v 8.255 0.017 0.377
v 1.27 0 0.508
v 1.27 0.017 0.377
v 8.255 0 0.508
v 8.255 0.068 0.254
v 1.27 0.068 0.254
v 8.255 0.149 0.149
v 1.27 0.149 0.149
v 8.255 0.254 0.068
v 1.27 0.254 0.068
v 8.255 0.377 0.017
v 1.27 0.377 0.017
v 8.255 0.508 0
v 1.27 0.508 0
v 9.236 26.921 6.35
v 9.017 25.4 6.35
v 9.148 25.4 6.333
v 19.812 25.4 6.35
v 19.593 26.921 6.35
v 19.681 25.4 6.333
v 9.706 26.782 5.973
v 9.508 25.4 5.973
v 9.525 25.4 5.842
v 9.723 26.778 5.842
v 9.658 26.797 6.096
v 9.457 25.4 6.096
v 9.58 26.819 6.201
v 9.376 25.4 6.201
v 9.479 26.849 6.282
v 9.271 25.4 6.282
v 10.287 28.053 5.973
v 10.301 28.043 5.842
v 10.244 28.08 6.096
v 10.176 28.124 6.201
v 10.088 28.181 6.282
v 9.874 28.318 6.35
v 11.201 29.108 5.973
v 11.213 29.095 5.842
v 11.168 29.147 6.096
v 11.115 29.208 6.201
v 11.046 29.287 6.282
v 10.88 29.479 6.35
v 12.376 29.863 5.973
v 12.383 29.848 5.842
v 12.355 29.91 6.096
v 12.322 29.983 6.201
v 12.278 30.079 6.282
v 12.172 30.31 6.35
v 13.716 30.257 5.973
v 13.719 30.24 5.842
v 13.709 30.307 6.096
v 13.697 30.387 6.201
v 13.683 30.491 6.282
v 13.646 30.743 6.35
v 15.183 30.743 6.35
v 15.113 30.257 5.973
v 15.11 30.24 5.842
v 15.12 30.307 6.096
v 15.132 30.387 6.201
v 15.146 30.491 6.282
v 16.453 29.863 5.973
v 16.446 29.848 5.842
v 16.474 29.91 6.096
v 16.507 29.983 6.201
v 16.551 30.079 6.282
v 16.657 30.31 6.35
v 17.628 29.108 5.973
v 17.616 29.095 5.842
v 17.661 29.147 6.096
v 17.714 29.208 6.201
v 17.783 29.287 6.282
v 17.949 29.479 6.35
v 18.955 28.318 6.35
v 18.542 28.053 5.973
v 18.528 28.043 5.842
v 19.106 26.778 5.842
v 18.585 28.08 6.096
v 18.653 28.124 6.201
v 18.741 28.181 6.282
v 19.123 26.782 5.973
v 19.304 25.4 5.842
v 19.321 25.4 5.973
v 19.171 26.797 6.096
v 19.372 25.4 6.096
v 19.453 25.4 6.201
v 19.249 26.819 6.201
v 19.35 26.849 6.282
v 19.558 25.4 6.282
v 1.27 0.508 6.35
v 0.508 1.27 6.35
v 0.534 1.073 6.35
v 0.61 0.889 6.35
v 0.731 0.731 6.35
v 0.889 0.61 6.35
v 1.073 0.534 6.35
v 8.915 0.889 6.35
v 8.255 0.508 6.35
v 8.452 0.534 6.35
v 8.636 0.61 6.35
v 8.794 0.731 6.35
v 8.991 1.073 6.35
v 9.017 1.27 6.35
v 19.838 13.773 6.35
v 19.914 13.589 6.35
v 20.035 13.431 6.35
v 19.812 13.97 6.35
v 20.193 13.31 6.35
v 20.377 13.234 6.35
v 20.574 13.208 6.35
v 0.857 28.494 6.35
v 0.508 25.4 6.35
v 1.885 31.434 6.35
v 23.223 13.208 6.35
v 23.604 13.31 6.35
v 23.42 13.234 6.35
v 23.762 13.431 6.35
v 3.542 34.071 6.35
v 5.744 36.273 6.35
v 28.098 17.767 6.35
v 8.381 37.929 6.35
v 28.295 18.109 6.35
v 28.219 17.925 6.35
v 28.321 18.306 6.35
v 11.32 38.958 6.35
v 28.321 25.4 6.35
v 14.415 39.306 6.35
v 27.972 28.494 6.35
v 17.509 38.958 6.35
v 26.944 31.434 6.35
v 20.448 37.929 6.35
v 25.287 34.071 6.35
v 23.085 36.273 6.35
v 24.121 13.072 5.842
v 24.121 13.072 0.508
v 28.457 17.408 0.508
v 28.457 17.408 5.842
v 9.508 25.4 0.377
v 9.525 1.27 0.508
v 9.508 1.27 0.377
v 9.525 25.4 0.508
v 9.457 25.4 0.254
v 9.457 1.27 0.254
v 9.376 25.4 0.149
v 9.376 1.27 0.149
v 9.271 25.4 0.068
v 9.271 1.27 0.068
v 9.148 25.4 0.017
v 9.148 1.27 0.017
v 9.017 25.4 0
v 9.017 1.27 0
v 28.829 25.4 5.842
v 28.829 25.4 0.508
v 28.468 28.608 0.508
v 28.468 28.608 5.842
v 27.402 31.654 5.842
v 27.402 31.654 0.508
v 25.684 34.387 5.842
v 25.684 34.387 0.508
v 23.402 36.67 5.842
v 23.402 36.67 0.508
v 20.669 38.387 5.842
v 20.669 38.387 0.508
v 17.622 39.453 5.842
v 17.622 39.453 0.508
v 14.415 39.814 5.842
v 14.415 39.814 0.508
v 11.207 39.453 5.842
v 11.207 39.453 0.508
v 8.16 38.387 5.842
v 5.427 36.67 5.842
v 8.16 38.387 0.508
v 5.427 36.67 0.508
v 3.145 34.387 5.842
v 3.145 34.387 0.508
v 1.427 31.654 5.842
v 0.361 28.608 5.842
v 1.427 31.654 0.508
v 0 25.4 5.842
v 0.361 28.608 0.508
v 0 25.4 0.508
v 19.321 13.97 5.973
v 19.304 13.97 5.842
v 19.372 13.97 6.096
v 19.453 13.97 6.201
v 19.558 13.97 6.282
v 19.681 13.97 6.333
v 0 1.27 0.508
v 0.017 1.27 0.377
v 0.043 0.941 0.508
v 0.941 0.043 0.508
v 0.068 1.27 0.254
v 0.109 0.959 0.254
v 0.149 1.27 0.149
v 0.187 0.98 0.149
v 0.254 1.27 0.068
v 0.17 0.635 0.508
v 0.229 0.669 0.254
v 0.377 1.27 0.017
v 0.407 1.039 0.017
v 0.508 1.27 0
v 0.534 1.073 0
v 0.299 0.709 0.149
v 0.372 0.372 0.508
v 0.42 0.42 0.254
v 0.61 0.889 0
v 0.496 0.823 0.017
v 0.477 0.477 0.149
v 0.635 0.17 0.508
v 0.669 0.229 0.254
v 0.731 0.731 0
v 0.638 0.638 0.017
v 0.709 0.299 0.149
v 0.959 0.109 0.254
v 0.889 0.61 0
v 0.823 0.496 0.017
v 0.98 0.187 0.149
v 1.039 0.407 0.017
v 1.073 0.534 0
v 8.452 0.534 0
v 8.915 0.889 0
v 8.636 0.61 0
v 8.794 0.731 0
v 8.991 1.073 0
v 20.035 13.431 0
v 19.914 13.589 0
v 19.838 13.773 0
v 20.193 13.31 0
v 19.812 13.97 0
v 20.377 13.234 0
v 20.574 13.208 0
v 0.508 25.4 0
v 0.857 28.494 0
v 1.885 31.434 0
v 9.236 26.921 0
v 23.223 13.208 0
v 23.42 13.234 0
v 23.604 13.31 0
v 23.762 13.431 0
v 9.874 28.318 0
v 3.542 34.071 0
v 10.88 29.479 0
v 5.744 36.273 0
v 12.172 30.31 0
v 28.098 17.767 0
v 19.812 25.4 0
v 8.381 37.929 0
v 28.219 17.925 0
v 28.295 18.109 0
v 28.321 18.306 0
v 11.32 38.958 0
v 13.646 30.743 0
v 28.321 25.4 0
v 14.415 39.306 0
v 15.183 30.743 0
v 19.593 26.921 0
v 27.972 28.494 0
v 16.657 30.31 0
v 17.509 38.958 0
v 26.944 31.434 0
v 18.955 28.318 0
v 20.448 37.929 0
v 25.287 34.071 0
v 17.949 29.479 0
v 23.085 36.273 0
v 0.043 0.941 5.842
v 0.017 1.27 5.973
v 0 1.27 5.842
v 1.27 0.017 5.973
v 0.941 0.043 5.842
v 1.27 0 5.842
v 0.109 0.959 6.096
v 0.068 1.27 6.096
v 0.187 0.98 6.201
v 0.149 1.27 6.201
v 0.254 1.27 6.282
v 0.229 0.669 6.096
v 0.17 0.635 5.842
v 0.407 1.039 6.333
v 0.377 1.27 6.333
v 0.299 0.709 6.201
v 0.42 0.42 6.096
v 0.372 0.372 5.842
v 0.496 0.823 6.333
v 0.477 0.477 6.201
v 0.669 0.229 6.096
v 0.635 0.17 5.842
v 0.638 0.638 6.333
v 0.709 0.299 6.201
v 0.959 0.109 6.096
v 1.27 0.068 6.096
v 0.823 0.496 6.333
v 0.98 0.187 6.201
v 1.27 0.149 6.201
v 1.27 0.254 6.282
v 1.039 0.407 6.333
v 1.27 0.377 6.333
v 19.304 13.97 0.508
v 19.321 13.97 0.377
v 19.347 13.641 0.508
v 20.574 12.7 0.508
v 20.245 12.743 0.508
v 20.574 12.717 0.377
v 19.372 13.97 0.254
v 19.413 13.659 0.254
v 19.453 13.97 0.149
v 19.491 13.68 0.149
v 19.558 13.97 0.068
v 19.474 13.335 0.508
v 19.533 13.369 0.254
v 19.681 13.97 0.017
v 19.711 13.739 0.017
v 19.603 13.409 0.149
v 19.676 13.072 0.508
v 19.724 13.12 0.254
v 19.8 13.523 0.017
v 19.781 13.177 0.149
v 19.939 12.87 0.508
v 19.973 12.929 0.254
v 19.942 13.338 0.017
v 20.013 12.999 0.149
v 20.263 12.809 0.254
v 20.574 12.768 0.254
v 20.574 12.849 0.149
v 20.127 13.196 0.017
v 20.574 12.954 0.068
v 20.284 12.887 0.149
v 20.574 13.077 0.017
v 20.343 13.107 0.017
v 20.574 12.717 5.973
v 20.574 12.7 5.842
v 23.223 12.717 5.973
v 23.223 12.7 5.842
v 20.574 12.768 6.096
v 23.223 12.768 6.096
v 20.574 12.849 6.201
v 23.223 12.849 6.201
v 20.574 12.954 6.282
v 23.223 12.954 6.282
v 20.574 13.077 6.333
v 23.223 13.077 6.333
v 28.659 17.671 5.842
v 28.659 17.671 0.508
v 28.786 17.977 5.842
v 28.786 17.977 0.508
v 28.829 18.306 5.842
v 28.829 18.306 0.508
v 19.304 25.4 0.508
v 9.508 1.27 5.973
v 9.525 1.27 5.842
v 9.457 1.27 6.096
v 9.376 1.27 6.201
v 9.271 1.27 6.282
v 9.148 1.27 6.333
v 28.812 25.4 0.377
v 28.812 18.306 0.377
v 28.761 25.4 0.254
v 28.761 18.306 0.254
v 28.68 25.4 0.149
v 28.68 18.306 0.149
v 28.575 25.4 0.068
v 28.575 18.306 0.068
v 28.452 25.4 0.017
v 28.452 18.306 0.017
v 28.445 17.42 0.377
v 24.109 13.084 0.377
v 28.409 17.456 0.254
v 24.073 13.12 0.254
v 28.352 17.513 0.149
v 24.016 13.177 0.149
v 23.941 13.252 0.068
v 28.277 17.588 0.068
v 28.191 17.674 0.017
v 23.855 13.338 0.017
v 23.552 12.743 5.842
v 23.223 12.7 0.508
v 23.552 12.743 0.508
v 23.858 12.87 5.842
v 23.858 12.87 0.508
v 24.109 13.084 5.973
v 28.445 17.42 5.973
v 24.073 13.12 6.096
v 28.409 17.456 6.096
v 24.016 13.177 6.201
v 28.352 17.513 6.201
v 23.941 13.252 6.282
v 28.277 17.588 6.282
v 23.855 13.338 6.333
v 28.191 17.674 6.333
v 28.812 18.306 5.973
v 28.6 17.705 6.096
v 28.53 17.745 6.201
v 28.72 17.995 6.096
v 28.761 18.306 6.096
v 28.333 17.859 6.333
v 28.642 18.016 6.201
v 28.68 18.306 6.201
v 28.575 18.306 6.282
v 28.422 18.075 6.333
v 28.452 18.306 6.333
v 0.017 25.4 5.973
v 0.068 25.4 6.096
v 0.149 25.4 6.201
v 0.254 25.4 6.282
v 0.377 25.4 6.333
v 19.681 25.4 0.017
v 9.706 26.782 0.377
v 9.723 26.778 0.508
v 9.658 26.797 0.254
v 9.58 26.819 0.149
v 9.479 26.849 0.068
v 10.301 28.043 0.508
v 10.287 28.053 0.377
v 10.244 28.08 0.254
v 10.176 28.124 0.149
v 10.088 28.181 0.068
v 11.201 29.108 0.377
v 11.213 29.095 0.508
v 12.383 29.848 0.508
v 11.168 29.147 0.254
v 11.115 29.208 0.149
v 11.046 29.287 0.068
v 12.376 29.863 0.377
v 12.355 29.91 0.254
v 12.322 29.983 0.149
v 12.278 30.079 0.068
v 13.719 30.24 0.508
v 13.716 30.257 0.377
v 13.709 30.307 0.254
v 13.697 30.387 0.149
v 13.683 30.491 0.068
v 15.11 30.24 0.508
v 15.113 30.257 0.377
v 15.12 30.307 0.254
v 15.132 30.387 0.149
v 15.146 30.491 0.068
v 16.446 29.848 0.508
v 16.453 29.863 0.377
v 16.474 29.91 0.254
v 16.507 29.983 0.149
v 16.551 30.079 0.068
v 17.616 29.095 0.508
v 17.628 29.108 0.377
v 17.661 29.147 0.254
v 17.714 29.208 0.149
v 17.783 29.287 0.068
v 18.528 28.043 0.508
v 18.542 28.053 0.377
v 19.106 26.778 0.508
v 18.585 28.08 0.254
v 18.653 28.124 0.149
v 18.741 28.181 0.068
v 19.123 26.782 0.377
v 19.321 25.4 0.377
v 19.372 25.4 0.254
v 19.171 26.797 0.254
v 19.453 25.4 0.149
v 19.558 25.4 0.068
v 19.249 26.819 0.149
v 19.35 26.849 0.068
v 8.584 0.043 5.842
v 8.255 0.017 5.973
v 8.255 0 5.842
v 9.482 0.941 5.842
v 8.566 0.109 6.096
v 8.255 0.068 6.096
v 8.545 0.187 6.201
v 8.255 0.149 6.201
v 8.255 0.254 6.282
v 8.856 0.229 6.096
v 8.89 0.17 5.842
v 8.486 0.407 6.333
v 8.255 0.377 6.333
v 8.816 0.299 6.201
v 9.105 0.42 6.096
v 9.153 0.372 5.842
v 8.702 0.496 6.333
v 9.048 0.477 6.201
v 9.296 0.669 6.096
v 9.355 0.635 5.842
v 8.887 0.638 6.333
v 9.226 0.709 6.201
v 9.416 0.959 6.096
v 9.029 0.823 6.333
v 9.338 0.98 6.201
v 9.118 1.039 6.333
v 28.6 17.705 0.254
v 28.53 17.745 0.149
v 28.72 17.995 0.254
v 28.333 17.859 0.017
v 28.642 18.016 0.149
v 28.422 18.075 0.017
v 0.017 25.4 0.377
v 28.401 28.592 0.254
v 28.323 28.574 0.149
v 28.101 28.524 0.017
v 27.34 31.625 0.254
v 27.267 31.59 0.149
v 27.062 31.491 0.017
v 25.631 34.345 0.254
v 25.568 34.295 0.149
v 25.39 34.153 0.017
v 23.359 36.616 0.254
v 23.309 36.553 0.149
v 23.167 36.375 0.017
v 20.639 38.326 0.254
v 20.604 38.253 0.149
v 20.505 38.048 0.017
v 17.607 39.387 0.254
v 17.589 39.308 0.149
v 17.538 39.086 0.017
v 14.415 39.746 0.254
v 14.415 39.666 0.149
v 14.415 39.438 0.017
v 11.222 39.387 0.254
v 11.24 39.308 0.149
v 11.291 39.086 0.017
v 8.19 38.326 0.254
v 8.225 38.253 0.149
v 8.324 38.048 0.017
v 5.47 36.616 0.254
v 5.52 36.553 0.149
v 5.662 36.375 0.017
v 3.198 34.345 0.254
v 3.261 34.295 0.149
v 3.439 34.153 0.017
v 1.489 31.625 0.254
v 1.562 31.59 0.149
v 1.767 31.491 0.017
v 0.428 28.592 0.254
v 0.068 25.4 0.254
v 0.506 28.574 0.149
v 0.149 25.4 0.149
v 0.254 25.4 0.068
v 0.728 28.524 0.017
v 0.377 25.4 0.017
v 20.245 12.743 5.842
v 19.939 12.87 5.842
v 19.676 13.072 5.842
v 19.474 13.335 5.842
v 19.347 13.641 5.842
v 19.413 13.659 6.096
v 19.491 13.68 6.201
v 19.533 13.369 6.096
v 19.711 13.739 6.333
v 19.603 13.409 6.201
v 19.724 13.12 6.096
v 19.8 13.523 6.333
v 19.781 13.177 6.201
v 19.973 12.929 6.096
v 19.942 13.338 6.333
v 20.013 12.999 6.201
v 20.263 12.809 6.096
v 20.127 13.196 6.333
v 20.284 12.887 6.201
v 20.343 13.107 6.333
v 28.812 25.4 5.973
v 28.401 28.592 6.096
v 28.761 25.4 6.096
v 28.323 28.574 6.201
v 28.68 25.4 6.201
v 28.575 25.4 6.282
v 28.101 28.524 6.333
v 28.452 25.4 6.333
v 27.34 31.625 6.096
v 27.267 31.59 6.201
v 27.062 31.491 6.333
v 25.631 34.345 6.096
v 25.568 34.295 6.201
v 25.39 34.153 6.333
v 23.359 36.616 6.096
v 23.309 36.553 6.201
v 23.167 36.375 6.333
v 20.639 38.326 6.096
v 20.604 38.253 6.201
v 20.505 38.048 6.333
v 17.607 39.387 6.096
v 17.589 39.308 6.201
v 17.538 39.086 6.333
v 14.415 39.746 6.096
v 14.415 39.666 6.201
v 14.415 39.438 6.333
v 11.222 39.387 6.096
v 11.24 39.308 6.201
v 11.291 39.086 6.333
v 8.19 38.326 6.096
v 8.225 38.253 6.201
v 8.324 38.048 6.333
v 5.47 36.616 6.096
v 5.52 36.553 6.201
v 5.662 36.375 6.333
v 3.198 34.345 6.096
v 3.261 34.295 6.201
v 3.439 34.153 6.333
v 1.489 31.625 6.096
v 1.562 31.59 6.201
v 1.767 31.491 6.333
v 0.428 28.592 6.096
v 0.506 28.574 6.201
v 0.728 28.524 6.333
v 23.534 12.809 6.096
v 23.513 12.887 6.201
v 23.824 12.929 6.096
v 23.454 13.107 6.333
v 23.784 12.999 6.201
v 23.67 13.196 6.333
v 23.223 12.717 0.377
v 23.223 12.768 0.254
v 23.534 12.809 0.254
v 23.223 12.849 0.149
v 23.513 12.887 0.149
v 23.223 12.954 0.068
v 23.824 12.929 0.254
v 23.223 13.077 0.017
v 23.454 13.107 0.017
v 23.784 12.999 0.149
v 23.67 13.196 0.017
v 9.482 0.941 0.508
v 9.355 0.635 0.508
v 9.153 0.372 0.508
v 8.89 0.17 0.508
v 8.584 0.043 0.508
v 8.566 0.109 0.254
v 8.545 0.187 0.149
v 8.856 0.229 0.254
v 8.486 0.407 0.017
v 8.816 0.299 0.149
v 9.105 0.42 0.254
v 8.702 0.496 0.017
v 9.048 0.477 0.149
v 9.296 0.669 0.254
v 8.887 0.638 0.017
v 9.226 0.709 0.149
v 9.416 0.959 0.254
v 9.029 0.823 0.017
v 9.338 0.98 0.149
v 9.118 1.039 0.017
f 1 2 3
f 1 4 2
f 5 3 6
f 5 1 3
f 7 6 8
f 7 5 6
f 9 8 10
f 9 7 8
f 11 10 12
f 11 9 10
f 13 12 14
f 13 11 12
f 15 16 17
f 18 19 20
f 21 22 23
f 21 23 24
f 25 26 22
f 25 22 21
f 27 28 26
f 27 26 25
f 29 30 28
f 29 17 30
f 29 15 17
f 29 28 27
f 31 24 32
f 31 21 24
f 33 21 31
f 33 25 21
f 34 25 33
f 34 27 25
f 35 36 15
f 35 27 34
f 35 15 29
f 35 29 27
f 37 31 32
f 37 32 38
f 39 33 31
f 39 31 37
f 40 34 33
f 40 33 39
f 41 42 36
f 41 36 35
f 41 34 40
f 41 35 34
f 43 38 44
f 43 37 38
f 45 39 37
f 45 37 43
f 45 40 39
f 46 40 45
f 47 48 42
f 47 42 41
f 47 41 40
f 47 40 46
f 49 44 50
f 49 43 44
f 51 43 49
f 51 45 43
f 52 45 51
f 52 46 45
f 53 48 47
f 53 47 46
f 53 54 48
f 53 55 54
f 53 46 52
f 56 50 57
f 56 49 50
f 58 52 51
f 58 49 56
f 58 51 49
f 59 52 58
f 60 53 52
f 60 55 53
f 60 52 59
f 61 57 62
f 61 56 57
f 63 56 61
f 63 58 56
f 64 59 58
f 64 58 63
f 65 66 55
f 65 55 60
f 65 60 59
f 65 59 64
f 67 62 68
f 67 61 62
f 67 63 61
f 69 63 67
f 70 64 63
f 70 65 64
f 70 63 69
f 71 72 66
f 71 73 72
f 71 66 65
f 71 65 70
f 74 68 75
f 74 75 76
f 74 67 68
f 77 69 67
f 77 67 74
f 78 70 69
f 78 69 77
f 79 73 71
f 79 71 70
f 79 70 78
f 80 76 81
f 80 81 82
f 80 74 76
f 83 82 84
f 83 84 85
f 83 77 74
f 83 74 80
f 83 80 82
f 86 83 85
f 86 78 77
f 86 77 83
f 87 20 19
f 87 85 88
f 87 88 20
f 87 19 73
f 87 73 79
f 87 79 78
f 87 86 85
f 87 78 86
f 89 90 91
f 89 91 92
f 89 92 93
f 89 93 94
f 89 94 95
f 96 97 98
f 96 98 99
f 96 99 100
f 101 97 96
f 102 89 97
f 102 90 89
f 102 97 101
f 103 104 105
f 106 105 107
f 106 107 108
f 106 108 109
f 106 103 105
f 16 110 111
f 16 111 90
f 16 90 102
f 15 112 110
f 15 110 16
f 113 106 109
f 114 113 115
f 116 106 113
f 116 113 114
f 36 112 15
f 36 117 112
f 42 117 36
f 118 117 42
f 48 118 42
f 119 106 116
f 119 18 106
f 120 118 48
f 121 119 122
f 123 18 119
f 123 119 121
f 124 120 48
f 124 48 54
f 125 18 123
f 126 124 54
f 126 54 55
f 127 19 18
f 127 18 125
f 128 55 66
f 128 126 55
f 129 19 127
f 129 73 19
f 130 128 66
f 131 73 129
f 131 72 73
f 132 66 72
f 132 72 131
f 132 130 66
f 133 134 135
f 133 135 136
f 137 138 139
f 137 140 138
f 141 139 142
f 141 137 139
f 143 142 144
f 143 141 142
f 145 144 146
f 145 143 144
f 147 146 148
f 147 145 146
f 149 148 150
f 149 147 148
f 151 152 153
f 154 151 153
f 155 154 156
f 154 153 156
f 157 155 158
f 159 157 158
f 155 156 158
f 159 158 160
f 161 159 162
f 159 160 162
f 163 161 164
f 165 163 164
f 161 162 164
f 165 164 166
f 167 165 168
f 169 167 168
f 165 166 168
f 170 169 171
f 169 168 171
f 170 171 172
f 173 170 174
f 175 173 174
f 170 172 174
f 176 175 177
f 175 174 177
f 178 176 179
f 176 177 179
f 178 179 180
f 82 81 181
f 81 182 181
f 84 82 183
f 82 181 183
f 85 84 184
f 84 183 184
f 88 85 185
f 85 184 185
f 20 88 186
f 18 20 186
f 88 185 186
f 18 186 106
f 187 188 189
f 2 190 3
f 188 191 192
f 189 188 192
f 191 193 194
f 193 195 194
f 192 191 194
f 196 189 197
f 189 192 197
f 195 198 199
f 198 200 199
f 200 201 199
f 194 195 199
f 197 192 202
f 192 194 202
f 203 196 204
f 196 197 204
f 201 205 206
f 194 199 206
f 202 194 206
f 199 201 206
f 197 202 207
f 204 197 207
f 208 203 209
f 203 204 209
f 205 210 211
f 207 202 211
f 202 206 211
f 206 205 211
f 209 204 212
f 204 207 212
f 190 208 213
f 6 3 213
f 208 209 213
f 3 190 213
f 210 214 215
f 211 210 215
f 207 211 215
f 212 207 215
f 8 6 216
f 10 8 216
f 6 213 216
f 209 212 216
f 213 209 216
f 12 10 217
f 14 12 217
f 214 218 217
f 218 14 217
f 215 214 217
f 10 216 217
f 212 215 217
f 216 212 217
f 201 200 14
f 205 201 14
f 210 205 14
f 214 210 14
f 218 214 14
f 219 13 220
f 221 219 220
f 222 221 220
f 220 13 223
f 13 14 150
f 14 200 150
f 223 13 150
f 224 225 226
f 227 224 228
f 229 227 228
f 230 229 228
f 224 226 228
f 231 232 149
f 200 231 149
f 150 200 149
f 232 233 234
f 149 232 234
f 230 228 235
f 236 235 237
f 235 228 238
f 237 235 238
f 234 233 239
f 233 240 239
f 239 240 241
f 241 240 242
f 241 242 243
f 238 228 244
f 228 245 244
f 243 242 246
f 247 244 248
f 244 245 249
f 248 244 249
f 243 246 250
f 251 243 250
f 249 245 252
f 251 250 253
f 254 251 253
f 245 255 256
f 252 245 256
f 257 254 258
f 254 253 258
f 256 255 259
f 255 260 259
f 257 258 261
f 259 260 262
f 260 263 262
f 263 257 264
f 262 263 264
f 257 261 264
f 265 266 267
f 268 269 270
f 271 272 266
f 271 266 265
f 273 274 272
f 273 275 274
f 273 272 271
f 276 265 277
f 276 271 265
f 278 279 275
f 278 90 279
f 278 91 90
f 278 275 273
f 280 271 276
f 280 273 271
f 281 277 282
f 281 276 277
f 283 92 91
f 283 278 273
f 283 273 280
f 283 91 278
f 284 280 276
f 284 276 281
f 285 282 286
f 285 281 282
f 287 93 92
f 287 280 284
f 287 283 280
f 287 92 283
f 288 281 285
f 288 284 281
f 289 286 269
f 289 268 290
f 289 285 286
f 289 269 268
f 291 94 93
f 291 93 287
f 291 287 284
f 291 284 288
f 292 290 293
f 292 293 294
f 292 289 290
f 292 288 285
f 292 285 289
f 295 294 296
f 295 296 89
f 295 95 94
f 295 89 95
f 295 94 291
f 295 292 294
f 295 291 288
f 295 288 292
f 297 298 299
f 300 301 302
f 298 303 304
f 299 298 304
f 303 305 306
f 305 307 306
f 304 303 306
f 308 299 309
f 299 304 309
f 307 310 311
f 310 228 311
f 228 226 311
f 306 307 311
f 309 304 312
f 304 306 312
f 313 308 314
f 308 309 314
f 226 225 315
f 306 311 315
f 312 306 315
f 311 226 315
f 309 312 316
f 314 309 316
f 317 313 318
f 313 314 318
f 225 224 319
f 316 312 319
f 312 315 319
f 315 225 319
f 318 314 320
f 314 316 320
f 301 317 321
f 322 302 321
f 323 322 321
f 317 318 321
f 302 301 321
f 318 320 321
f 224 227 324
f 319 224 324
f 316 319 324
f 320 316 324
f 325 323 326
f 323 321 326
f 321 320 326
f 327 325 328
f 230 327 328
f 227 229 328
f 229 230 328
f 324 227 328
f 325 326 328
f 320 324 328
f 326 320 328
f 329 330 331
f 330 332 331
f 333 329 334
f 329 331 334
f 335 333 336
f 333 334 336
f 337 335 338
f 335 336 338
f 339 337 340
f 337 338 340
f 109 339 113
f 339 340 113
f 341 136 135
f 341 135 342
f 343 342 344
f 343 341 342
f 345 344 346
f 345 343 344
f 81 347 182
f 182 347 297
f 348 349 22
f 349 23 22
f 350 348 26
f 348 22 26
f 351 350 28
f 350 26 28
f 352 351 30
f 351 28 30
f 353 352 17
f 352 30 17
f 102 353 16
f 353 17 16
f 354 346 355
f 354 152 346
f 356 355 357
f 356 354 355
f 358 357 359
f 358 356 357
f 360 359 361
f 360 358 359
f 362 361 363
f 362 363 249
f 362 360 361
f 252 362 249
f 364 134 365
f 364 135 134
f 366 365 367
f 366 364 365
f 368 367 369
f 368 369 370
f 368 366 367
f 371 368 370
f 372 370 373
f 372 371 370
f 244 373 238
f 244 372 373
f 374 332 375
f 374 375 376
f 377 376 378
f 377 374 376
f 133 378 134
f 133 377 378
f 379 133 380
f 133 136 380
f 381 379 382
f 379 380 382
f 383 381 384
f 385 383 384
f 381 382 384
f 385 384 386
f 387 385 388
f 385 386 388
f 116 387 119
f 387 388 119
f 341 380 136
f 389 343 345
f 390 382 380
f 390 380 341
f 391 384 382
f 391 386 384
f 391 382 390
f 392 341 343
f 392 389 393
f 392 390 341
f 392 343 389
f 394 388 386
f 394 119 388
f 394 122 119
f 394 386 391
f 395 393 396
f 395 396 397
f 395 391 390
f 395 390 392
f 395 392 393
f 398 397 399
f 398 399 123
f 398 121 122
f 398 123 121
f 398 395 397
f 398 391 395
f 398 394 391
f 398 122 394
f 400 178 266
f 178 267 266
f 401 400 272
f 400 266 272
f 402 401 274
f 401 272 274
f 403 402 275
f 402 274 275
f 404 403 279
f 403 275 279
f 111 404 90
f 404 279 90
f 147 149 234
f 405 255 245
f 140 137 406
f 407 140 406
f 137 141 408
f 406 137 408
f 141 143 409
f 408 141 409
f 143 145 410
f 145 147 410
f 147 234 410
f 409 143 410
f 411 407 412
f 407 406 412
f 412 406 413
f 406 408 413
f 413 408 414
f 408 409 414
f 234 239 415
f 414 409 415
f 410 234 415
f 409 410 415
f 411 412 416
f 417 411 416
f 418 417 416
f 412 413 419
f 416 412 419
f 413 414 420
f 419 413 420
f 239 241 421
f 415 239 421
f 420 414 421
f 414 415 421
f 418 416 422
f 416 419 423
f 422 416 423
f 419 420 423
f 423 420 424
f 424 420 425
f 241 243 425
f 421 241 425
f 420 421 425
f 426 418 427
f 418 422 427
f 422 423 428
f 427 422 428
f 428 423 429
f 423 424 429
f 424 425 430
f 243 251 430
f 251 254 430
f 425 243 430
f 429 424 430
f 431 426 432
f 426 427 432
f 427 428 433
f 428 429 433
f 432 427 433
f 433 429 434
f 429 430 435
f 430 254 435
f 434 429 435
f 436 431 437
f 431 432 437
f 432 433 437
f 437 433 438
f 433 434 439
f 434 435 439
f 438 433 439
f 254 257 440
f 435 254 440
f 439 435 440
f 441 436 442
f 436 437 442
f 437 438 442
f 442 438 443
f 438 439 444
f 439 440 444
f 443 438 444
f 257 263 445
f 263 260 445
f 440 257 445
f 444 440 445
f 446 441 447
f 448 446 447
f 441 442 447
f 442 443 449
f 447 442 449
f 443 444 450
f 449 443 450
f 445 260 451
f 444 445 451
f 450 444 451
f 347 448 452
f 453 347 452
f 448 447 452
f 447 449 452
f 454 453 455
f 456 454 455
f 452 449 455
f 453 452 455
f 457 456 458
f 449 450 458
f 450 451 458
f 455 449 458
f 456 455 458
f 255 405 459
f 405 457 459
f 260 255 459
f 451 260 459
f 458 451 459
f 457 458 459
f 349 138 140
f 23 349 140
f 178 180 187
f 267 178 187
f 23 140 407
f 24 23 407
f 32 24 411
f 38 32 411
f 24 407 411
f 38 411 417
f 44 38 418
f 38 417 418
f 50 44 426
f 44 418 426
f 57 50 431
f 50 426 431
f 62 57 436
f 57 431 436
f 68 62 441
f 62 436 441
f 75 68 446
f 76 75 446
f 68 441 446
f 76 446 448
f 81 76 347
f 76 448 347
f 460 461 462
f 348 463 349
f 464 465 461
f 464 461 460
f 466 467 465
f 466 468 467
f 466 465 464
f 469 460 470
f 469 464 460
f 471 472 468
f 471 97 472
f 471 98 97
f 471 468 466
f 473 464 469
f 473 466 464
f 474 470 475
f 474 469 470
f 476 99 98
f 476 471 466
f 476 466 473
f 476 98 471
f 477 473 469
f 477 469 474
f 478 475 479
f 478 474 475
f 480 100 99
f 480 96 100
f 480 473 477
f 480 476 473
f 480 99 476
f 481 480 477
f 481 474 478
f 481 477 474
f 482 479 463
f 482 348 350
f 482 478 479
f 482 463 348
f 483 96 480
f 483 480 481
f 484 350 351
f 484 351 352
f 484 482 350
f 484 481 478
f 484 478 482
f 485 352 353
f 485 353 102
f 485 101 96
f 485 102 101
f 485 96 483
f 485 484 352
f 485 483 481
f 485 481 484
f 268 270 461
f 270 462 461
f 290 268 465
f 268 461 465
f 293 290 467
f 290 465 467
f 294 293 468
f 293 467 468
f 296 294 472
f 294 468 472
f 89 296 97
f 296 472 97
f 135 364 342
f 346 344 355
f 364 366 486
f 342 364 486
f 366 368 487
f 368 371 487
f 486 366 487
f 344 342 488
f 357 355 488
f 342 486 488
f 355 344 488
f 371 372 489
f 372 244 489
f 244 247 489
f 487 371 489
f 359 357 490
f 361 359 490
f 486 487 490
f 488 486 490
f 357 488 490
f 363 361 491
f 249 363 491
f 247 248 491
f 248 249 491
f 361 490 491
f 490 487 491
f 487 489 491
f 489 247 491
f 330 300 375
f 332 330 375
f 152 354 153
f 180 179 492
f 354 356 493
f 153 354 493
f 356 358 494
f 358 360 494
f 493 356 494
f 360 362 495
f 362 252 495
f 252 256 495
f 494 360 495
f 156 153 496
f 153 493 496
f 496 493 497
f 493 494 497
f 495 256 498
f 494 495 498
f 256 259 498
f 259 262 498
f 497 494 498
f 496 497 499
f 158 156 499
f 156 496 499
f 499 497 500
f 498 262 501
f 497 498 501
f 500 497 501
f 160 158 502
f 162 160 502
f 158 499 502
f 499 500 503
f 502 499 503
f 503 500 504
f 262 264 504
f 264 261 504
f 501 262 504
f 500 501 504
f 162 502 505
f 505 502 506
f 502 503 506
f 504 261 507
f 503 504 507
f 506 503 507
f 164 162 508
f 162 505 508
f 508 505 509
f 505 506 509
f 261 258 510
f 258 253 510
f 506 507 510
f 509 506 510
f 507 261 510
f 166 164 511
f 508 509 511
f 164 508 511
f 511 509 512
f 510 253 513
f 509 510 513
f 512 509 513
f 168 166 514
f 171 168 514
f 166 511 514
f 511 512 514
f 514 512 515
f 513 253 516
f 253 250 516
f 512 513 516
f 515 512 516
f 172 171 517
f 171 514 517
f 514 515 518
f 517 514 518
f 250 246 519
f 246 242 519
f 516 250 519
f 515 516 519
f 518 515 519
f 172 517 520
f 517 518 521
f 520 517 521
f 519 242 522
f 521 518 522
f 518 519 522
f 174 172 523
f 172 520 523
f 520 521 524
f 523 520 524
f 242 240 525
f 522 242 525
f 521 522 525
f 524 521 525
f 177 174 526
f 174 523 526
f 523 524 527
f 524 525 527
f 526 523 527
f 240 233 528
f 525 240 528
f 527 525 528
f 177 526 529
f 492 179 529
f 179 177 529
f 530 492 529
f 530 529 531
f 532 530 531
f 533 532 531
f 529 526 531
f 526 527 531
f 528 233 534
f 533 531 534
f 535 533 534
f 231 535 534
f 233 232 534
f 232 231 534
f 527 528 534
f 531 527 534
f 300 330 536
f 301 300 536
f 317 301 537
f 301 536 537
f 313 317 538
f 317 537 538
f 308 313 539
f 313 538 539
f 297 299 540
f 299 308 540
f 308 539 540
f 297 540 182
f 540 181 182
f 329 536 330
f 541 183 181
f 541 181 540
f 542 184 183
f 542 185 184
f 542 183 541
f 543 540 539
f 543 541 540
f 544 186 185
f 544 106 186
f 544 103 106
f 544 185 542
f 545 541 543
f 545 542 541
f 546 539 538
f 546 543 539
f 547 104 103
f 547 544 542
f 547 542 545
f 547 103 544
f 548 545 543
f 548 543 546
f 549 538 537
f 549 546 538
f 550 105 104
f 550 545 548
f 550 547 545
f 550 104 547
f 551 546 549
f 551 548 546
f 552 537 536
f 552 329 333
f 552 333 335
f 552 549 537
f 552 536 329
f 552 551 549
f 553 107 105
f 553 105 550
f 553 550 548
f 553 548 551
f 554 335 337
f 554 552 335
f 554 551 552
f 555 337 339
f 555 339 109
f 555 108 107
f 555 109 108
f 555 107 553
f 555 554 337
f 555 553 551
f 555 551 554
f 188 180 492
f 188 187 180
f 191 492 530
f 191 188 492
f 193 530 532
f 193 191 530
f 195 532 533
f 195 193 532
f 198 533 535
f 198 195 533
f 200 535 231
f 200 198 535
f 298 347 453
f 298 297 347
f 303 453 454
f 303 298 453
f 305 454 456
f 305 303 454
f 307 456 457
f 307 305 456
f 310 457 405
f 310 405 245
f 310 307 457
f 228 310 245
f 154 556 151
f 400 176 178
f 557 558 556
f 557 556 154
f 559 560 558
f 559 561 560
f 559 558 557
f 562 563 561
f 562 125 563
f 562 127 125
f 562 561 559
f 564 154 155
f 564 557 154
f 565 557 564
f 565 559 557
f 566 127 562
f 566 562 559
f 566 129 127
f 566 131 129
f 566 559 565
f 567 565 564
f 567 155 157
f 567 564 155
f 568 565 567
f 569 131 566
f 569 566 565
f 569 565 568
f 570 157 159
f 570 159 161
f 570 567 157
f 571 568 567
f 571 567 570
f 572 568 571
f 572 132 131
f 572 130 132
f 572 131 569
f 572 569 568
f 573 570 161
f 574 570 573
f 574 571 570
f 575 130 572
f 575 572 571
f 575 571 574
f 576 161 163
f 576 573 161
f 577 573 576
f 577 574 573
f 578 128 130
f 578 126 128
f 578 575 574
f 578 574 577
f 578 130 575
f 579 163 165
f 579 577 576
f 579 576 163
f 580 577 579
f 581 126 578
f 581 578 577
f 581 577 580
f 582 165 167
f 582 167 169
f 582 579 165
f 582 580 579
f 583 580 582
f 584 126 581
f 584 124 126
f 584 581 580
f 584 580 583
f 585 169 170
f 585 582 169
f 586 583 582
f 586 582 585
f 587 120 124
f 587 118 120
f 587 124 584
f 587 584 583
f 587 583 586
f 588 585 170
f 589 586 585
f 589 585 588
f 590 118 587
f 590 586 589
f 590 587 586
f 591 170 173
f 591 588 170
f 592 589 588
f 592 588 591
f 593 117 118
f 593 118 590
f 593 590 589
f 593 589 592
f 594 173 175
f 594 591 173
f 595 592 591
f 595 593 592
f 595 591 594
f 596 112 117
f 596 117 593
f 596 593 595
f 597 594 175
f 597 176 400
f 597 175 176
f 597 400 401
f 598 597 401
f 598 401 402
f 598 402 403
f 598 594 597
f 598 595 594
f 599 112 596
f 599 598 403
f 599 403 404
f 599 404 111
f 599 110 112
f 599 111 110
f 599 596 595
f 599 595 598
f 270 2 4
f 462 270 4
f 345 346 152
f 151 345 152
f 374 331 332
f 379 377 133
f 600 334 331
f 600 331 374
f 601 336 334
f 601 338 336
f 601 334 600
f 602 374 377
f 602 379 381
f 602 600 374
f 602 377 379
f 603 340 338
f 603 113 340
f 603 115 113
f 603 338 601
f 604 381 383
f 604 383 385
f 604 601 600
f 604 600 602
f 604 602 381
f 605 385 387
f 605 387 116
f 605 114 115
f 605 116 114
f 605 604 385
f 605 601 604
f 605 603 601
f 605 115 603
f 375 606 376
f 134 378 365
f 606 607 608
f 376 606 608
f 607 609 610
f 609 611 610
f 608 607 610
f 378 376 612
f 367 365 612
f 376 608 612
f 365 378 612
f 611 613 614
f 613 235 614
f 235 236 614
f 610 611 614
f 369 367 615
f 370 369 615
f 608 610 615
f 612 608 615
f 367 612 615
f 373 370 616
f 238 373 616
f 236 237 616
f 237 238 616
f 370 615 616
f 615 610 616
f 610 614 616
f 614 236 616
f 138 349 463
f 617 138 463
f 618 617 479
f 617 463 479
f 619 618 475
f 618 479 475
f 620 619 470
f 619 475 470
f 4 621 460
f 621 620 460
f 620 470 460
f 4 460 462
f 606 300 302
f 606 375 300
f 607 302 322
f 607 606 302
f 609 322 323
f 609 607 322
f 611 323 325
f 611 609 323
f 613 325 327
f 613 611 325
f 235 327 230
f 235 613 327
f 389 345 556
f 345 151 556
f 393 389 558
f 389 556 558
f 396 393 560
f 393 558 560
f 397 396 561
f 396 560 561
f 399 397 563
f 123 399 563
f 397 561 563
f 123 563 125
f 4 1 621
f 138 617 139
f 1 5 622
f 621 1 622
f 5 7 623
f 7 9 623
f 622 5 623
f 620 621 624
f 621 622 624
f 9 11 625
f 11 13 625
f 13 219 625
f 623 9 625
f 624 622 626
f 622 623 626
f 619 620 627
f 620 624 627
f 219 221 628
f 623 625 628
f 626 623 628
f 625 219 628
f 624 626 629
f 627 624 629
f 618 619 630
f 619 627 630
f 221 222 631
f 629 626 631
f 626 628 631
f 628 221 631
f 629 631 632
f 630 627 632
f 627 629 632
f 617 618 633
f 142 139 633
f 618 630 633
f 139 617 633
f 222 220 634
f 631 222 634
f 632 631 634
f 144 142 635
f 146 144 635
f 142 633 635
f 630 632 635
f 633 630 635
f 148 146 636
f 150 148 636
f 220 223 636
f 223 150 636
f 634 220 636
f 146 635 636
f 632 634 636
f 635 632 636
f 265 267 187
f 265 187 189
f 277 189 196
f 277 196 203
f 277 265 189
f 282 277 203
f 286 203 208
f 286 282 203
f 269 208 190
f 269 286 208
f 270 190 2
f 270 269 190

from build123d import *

# Parameters (mm, degrees)
F1_DEPTH = 6.35
F2_SIZE  = 5.08
F3_R     = 1.27
F4_R     = 0.508


with BuildPart() as f1:
    # F0 (on Top) → F1 (new body)
    with BuildSketch(Plane.XY):
        with BuildLine():
            Line((0, 25.4), (0, 0))
            Line((0, 0), (9.525, 0))
            Line((9.525, 0), (9.525, 25.4))
            ThreePointArc((9.525, 25.4), (14.4145, 30.2895), (19.304, 25.4))
            Line((19.304, 25.4), (19.304, 12.7))
            Line((19.304, 12.7), (28.829, 12.7))
            Line((28.829, 12.7), (28.829, 25.4))
            ThreePointArc((28.829, 25.4), (14.4145, 39.8145), (0, 25.4))
        make_face()
    extrude(amount=F1_DEPTH)

    # F2
    f2_edges = [f1.edges().sort_by_distance(p)[0] for p in [
        (28.829, 12.7, 3.175),
    ]]
    chamfer(f2_edges, length=F2_SIZE)

    # F3
    f3_edges = [f1.edges().sort_by_distance(p)[0] for p in [
        (23.749, 12.7, 3.175),
        (28.829, 17.78, 3.175),
        (19.304, 12.7, 3.175),
        (0, 0, 3.175),
        (9.525, 0, 3.175),
    ]]
    fillet(f3_edges, radius=F3_R)

    # F4
    f4_edges = [f1.edges().sort_by_distance(p)[0] for p in [
        (21.898474, 12.7, 6.35),
        (19.675974, 13.071974, 6.35),
        (23.708957, 12.796673, 6.35),
        (19.304, 19.685, 6.35),
        (26.289, 15.24, 6.35),
        (14.4145, 30.2895, 6.35),
        (28.732327, 17.820043, 6.35),
        (9.525, 13.335, 6.35),
        (28.829, 21.853026, 6.35),
        (9.153026, 0.371974, 6.35),
        (14.4145, 39.8145, 6.35),
        (4.7625, 0, 6.35),
        (0, 13.335, 6.35),
        (0.371974, 0.371974, 6.35),
        (21.898474, 12.7, 0),
        (19.675974, 13.071974, 0),
        (23.708957, 12.796673, 0),
        (19.304, 19.685, 0),
        (26.289, 15.24, 0),
        (14.4145, 30.2895, 0),
        (28.732327, 17.820043, 0),
        (9.525, 13.335, 0),
        (28.829, 21.853026, 0),
        (9.153026, 0.371974, 0),
        (14.4145, 39.8145, 0),
        (4.7625, 0, 0),
        (0, 13.335, 0),
        (0.371974, 0.371974, 0),
    ]]
    fillet(f4_edges, radius=F4_R)


solid = f1.part
